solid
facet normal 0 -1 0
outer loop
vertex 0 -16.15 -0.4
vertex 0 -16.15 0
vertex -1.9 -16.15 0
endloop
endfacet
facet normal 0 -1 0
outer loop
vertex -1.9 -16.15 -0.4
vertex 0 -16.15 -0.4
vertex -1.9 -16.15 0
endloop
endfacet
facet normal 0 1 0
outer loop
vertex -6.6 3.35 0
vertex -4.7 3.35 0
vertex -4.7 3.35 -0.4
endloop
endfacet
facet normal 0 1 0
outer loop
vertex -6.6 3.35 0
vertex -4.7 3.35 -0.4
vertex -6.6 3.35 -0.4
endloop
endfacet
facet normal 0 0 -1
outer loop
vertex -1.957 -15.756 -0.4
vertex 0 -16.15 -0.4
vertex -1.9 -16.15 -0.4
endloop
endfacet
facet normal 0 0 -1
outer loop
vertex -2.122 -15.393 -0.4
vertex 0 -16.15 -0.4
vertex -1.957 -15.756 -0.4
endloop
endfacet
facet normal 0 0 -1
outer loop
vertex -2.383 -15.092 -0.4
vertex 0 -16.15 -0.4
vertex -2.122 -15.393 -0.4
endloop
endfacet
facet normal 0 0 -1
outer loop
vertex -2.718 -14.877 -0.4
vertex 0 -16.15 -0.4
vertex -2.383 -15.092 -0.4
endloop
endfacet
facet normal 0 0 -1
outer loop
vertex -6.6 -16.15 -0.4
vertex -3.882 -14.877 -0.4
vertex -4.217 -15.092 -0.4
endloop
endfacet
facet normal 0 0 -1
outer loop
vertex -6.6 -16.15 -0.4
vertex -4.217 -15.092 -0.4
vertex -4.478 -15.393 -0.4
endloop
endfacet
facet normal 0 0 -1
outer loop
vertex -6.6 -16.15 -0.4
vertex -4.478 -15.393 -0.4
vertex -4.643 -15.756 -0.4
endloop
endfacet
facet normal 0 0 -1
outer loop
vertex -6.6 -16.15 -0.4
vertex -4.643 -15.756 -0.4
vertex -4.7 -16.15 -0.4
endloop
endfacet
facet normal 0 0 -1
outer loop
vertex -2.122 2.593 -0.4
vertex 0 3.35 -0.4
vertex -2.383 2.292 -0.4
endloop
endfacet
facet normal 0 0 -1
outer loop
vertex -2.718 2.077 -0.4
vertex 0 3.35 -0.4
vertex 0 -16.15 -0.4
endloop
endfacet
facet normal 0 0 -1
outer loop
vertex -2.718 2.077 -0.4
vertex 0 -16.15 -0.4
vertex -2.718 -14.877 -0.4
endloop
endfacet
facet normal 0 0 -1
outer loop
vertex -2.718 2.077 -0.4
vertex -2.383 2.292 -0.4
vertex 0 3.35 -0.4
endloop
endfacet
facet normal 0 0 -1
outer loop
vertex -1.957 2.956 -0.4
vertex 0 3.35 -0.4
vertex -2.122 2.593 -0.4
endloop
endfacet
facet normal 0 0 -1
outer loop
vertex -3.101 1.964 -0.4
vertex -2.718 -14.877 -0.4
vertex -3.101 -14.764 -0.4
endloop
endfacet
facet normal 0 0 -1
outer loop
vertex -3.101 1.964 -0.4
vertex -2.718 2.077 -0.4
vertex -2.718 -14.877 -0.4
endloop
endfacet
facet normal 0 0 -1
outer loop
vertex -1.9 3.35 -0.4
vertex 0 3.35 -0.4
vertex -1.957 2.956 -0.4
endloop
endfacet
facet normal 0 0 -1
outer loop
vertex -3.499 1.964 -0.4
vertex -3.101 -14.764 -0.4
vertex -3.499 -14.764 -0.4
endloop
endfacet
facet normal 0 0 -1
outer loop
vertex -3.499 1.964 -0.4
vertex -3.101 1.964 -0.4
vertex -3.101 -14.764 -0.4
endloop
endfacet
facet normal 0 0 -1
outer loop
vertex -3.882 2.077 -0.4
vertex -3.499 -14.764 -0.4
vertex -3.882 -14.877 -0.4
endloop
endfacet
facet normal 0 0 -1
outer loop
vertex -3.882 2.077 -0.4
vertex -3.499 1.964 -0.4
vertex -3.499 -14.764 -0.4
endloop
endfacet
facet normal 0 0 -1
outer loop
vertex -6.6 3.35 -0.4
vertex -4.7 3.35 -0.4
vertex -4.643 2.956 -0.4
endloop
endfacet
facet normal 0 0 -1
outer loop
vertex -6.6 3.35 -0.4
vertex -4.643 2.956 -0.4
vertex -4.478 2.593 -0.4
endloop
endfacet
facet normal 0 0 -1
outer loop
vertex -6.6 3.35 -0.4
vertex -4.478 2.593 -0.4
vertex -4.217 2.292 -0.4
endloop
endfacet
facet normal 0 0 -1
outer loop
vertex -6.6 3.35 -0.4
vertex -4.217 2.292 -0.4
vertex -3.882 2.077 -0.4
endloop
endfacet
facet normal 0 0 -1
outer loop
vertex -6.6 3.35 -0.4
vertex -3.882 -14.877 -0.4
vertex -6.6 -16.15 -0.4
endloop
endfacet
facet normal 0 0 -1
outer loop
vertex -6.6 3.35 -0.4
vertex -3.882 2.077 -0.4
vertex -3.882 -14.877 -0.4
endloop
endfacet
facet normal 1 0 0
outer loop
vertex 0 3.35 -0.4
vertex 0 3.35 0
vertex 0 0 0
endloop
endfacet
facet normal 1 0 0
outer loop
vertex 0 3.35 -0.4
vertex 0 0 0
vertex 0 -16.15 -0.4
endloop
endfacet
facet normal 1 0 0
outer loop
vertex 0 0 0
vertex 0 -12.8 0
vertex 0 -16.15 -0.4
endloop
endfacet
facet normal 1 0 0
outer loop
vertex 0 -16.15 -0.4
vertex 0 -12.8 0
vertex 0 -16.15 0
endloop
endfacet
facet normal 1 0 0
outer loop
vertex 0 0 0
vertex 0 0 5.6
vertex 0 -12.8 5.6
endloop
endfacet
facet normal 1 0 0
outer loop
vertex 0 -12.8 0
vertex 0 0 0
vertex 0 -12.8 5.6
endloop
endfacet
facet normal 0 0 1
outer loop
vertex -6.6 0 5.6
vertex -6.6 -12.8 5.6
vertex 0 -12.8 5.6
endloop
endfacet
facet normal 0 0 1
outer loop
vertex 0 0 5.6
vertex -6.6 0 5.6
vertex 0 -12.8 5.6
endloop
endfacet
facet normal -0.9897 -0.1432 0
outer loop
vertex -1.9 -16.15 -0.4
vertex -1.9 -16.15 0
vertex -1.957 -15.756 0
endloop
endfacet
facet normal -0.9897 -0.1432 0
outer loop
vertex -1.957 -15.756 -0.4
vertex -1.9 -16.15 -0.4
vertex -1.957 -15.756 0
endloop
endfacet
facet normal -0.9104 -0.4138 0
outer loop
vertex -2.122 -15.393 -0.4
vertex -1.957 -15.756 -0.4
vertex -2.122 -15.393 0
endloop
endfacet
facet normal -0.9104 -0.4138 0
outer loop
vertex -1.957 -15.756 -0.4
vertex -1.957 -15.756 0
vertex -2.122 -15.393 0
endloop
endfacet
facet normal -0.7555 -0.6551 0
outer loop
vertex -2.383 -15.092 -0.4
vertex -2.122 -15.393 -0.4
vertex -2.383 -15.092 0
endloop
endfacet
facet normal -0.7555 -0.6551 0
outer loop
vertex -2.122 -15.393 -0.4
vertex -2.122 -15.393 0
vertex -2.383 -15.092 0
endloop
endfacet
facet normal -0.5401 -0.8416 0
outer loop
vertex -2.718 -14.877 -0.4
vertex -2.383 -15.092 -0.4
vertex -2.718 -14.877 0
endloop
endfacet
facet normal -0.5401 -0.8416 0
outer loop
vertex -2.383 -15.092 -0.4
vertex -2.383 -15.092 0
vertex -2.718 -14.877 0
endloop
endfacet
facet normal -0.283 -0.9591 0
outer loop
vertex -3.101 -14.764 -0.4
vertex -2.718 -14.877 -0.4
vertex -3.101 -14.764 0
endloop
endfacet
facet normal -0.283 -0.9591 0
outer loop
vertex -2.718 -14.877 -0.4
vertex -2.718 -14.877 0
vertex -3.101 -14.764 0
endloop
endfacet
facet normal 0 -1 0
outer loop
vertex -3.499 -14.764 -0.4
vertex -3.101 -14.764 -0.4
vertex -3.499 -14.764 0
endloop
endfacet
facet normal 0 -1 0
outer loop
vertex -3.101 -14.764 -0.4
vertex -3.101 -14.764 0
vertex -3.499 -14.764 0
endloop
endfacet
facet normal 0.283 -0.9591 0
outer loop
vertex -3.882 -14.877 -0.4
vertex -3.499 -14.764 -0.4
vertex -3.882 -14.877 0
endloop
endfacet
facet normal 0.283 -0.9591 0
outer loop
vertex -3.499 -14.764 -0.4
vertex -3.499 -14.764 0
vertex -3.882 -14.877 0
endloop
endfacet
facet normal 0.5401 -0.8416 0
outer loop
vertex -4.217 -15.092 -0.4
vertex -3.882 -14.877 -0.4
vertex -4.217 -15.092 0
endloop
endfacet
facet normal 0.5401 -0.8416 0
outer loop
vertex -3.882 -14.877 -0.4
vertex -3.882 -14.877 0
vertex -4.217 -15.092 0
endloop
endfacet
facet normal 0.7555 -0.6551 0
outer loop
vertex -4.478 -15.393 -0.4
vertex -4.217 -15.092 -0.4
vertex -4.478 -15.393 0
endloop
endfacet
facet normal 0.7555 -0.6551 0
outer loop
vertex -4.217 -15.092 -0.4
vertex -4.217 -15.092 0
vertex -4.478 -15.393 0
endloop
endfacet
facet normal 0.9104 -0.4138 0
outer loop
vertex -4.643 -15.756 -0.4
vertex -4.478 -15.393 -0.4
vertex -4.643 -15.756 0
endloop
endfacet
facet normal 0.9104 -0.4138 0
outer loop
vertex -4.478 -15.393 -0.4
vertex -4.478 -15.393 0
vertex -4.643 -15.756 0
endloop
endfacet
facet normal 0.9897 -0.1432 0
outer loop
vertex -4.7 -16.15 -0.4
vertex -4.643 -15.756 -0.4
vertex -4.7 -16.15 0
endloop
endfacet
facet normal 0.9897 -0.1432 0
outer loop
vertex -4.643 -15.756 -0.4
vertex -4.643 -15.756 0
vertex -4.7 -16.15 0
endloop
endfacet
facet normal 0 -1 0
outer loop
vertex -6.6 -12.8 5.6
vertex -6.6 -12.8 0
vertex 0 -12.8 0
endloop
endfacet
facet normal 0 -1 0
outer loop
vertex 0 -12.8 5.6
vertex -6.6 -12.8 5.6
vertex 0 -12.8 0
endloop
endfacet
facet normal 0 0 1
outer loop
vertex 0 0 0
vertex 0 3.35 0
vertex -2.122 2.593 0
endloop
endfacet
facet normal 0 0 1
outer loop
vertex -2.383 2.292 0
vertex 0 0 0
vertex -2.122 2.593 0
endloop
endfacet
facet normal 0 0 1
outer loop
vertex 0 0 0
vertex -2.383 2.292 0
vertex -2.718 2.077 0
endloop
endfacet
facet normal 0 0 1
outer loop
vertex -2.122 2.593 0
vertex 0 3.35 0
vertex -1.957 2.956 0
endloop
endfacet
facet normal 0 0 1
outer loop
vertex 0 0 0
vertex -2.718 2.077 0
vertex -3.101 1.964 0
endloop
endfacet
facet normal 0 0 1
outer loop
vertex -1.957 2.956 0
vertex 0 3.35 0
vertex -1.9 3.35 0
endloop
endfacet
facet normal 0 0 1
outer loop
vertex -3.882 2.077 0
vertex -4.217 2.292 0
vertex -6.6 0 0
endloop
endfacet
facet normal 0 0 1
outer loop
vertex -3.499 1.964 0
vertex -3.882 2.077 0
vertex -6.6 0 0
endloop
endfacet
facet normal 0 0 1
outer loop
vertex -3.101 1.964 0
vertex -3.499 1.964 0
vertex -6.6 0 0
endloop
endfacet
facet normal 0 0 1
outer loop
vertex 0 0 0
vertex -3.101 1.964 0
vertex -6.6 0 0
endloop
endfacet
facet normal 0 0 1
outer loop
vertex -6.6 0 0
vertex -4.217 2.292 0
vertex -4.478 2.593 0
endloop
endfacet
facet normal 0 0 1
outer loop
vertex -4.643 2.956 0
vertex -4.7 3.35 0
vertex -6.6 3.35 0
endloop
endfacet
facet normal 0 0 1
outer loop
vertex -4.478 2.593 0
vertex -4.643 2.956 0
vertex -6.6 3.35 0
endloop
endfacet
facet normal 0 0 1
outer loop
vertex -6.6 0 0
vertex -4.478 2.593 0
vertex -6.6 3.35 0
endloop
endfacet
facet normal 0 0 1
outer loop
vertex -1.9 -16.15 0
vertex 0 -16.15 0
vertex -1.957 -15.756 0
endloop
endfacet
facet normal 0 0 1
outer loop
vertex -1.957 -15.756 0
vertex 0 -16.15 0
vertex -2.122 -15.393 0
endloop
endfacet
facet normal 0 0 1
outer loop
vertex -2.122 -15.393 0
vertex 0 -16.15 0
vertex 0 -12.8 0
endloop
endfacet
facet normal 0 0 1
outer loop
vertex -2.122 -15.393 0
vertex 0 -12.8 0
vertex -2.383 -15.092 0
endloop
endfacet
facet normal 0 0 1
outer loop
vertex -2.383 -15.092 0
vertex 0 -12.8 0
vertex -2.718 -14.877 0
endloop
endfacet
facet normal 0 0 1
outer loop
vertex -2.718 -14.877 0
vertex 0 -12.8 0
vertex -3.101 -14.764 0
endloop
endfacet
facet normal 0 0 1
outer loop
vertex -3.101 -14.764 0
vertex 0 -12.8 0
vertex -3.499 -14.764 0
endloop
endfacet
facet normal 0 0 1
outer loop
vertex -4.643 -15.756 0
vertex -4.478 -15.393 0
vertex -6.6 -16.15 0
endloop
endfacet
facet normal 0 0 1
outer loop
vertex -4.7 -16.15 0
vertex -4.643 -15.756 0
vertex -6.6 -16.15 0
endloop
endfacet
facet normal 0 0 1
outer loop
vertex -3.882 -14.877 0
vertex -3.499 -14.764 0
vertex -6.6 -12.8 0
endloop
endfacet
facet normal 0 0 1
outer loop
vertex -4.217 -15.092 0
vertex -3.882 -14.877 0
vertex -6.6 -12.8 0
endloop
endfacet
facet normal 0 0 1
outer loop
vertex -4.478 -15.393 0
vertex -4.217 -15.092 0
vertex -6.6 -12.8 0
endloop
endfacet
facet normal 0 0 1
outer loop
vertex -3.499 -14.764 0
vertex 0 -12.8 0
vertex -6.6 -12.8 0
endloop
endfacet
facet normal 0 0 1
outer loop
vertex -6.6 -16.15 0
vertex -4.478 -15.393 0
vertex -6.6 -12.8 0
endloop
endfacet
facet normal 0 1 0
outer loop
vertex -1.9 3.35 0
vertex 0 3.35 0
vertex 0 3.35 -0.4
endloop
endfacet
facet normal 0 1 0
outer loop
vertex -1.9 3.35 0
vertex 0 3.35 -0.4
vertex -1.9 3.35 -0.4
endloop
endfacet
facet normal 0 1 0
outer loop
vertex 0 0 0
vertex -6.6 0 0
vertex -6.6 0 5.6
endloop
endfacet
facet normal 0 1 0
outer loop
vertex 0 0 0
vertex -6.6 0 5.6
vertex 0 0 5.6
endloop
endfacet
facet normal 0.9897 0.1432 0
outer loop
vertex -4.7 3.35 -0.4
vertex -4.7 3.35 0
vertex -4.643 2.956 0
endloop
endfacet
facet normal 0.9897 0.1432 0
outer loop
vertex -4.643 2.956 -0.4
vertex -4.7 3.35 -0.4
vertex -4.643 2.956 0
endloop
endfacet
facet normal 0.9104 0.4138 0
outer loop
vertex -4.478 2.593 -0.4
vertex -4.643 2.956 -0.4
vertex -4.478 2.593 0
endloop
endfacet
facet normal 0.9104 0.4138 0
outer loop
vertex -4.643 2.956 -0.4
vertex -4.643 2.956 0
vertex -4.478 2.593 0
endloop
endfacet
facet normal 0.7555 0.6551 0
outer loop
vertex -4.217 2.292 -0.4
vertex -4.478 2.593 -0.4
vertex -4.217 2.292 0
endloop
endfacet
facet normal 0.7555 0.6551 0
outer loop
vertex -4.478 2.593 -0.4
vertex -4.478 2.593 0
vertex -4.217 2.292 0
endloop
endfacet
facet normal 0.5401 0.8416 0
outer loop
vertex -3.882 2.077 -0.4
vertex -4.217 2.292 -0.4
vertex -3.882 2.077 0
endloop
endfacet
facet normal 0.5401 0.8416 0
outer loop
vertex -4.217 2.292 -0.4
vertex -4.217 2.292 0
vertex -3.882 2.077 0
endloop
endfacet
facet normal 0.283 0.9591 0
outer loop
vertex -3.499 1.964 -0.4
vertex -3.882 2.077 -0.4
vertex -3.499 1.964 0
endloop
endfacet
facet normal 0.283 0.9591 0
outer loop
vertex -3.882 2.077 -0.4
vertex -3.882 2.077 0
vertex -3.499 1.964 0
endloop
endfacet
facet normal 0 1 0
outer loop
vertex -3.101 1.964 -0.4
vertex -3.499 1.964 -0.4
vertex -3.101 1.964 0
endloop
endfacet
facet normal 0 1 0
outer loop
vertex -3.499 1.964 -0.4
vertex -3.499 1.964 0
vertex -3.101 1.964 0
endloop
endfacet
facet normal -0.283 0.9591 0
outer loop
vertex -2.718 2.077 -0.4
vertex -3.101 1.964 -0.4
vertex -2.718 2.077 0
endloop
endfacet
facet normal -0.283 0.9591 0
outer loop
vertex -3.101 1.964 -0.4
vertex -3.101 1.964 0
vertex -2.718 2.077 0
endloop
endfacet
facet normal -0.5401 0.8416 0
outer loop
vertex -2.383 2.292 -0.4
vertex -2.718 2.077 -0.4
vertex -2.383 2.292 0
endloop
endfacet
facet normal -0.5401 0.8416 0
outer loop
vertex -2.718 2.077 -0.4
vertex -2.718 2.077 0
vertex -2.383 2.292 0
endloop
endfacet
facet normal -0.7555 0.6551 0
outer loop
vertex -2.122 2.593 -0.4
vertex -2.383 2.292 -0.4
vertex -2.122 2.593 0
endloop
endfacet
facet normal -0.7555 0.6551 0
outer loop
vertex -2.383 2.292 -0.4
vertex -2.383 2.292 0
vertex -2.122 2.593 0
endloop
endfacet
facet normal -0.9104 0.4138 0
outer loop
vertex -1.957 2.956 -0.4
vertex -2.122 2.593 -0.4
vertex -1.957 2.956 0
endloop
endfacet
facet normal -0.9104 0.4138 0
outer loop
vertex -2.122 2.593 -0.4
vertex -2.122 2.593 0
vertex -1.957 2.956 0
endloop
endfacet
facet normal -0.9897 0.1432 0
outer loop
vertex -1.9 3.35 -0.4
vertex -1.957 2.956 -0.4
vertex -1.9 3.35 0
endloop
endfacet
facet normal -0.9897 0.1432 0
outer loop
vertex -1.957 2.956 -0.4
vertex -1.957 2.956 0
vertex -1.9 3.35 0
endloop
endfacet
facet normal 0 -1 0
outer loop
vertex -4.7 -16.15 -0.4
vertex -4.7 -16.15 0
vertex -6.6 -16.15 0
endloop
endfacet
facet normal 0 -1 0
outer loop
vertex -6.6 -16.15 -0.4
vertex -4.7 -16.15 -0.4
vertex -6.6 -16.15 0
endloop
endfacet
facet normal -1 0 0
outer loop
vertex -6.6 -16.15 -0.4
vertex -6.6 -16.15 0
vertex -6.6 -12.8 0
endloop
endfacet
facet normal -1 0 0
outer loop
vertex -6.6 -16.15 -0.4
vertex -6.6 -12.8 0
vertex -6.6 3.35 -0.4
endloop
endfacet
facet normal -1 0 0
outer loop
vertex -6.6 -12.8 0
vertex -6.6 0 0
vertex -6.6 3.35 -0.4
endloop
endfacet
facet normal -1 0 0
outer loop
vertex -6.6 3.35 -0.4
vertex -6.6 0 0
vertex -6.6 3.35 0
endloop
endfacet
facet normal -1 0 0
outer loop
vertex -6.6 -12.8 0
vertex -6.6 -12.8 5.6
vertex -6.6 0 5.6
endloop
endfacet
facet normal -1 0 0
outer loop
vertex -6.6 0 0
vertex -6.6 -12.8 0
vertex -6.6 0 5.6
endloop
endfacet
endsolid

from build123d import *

# Parameters (mm, degrees)
ESQUISSE1_W        = 6.6
ESQUISSE1_H        = 12.8
BOSS_EXTRU_1_DEPTH = 5.6
ESQUISSE2_W        = 1.9
ESQUISSE2_H        = 12.8
ESQUISSE2_W_2      = 2.8
ESQUISSE2_H_2      = 3.35
BOSS_EXTRU_2_DEPTH = 0.4


with BuildPart() as part:
    # Esquisse1 → Boss.-Extru.1 (new body)
    with BuildSketch(Plane.XY):
        with Locations((-3.3, -6.4)):
            Rectangle(ESQUISSE1_W, ESQUISSE1_H)
    extrude(amount=BOSS_EXTRU_1_DEPTH)

    # Esquisse2 → Boss.-Extru.2 (add)
    with BuildSketch(Plane(origin=(0, 0, 0), x_dir=(-1, 0, 0), z_dir=(0, 0, -1))):
        with Locations((0.95, -6.4)):
            Rectangle(ESQUISSE2_W, ESQUISSE2_H)
        with Locations((3.3, -6.4)):
            Rectangle(ESQUISSE2_W_2, ESQUISSE2_H)
        with Locations((5.65, -6.4)):
            Rectangle(ESQUISSE2_W, ESQUISSE2_H)
        with Locations((0.95, -14.475)):
            Rectangle(ESQUISSE2_W, ESQUISSE2_H_2)
        with BuildLine():
            Line((4.7, -12.8), (1.9, -12.8))
            Line((1.9, -12.8), (1.9, -16.15))
            ThreePointArc((1.9, -16.15), (3.3, -14.75), (4.7, -16.15))
            Line((4.7, -16.15), (4.7, -12.8))
        make_face()
        with Locations((5.65, -14.475)):
            Rectangle(ESQUISSE2_W, ESQUISSE2_H_2)
        with Locations((0.95, 1.675)):
            Rectangle(ESQUISSE2_W, ESQUISSE2_H_2)
        with BuildLine():
            ThreePointArc((4.7, 3.35), (3.3, 1.95), (1.9, 3.35))
            Line((1.9, 3.35), (1.9, 0))
            Line((1.9, 0), (4.7, 0))
            Line((4.7, 0), (4.7, 3.35))
        make_face()
        with Locations((5.65, 1.675)):
            Rectangle(ESQUISSE2_W, ESQUISSE2_H_2)
    extrude(amount=BOSS_EXTRU_2_DEPTH)


solid = part.part
